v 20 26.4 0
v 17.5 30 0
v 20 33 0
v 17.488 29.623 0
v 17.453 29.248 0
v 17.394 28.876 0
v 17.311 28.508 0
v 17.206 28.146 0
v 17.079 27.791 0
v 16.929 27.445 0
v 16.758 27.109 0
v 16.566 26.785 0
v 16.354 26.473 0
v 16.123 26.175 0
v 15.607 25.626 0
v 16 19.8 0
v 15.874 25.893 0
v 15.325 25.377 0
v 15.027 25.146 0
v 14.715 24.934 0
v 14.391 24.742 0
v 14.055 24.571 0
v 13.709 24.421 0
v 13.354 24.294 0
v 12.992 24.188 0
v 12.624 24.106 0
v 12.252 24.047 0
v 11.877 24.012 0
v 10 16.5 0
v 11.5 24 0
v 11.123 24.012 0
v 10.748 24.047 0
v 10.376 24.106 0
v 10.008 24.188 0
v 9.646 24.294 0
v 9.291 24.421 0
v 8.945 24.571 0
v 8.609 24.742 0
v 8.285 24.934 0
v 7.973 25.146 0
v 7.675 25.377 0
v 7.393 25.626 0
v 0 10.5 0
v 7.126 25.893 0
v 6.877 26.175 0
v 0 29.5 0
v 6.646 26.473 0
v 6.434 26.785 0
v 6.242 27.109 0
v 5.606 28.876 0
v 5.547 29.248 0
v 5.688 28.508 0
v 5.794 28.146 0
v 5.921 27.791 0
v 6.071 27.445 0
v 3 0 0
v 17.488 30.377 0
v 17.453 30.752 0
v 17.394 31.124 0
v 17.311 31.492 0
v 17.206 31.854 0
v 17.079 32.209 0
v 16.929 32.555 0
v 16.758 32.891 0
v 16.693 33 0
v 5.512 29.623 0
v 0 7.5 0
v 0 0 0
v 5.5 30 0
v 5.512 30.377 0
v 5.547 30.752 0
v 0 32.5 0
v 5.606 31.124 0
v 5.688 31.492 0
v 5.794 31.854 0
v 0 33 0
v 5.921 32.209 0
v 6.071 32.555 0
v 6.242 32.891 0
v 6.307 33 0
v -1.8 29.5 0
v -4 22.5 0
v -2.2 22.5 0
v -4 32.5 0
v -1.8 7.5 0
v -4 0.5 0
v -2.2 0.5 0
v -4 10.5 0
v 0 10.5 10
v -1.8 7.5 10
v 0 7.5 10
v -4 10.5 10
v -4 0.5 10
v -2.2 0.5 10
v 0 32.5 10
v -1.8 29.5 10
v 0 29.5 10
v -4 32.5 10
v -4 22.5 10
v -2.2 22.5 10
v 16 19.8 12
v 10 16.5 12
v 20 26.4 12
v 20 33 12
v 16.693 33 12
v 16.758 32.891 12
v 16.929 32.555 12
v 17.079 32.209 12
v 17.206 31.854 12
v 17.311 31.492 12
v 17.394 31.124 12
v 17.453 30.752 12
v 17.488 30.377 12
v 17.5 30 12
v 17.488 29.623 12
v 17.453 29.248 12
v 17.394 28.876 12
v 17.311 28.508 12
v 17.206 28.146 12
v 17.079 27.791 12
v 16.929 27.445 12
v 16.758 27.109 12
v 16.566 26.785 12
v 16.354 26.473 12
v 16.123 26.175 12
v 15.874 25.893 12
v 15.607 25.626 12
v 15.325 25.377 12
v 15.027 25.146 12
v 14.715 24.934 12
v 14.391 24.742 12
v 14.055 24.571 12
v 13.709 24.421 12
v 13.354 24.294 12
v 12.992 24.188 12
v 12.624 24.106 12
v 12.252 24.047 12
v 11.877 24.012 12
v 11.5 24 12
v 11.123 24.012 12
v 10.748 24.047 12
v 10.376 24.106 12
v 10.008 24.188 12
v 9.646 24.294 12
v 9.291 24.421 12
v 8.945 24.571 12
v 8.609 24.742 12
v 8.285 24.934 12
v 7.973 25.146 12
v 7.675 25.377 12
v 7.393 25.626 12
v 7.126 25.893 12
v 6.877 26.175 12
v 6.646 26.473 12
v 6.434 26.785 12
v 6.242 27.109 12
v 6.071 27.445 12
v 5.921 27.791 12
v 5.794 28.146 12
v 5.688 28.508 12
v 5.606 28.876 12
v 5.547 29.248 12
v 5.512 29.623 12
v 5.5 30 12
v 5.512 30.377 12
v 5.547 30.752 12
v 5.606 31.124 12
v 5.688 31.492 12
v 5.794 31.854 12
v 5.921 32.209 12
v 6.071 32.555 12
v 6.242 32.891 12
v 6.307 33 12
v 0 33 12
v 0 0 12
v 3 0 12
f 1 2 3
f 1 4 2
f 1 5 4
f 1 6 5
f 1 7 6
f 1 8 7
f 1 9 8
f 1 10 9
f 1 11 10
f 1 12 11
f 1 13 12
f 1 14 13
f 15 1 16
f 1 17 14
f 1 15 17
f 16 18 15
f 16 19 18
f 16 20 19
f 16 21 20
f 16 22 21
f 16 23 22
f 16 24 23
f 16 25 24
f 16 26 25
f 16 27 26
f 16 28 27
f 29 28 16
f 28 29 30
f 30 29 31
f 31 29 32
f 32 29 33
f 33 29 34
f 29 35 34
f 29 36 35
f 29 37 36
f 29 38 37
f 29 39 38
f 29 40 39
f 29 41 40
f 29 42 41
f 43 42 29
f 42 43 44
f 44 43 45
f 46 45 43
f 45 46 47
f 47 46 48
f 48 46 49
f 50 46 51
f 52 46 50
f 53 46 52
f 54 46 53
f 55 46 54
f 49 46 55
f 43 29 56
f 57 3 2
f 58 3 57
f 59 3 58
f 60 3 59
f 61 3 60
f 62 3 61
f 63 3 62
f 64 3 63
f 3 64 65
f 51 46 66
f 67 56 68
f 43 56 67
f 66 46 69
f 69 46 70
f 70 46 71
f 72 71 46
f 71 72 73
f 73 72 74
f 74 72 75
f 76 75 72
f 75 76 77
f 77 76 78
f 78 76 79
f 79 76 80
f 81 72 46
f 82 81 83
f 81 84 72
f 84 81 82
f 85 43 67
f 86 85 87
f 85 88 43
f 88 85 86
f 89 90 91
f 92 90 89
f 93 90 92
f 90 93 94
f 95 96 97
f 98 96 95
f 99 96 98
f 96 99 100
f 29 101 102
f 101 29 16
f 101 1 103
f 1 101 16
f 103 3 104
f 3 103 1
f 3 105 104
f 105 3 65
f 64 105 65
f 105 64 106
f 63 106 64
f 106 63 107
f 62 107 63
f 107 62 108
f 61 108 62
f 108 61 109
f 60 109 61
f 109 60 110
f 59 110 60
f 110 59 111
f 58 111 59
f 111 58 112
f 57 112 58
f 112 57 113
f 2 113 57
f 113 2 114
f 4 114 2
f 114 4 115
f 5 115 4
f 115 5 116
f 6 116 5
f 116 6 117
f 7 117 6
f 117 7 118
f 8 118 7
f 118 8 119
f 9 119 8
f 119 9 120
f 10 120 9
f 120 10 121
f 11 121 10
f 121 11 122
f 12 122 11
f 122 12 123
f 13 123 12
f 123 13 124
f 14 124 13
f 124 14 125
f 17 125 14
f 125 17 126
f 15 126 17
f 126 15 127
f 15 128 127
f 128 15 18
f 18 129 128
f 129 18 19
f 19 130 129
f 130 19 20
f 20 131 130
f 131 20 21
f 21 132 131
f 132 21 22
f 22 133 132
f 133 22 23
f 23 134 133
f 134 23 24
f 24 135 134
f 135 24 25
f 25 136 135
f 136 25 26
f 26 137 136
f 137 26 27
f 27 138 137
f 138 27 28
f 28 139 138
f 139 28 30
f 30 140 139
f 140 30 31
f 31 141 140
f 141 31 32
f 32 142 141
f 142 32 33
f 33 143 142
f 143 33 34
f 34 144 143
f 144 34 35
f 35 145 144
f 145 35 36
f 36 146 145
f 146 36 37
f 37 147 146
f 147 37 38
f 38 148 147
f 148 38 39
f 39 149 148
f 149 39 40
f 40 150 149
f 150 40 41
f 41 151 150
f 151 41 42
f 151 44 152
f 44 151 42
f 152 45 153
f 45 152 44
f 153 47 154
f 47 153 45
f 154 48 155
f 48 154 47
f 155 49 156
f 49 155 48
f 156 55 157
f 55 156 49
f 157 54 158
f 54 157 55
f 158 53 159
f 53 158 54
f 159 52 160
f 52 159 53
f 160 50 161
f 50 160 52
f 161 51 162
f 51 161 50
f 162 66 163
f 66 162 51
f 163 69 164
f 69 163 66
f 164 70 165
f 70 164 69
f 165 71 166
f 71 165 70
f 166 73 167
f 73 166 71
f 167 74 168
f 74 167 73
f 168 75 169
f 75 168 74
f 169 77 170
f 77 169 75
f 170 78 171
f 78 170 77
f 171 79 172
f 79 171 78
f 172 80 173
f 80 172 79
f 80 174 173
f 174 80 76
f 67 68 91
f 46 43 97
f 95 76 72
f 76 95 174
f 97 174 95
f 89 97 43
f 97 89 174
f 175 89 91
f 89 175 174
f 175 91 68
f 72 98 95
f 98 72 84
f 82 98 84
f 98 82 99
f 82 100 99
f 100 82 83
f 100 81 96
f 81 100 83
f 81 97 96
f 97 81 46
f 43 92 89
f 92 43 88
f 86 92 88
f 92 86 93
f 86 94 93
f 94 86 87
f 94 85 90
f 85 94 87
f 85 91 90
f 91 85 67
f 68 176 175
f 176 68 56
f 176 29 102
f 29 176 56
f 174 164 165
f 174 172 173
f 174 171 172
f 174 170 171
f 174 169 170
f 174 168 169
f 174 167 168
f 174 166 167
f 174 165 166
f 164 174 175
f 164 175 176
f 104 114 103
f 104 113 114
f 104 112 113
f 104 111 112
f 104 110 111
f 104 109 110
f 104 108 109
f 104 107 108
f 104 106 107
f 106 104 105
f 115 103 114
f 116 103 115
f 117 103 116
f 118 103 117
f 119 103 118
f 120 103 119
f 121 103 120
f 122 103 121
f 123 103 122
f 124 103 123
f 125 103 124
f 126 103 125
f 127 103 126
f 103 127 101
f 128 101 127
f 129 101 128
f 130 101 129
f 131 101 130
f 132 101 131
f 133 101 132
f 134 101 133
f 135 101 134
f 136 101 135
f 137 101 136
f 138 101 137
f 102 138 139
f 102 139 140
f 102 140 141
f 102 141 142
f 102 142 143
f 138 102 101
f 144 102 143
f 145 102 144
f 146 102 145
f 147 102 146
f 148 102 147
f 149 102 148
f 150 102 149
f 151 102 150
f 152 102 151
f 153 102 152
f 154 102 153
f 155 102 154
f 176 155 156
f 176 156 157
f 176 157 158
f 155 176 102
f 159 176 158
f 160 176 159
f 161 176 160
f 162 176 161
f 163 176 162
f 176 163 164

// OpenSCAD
$fn=100;

peice1_height = 10;
peice1_width = 4;
peice1_thickness = 3;
peice1_Ratio = 0.9;
    
peice2_height = 33;
peice2_width = 20;
peice2_thickness = 3;
piece2_hole_diameter = 12;
piece2_hole_x_shift = 5.5;
piece2_hole_y_shift = 3;

global_thickness = 10;
global_attach_gap = 12;

module piece1() {


    polygon(points = [[0,0],[0,peice1_height],[peice1_width,peice1_height],[peice1_width,peice1_height-peice1_thickness],[peice1_width/2*(2-peice1_Ratio),peice1_height-peice1_thickness],[peice1_width/2*peice1_Ratio,0]]);
}

module piece2() {

    
    difference() {
        polygon(points = [[0,0],[0,peice2_height],[peice2_width,peice2_height],[peice2_width,peice2_height*0.8],[peice2_width*0.8,peice2_height*0.6],[peice2_width*0.5,peice2_height*0.5],[peice2_thickness,0]]);
        translate([piece2_hole_x_shift + piece2_hole_diameter/2, peice2_height - piece2_hole_diameter/2 + piece2_hole_y_shift])
            circle(d=piece2_hole_diameter);
    }
}

module global() {
    piece1_y1 = (peice2_height - global_attach_gap - 2*peice1_height)/2;
    piece1_y2 = piece1_y1 + global_attach_gap + peice1_height;
    
    translate([-peice1_width, piece1_y1])
        piece1();
    
    translate([-peice1_width, piece1_y2])
        piece1();

    piece2();
}

// Etrude global
linear_extrude(height = global_thickness)
    global();

// Extrude piece2 on top of global
translate([0,0,global_thickness])
    linear_extrude(height = 2)
        piece2();
